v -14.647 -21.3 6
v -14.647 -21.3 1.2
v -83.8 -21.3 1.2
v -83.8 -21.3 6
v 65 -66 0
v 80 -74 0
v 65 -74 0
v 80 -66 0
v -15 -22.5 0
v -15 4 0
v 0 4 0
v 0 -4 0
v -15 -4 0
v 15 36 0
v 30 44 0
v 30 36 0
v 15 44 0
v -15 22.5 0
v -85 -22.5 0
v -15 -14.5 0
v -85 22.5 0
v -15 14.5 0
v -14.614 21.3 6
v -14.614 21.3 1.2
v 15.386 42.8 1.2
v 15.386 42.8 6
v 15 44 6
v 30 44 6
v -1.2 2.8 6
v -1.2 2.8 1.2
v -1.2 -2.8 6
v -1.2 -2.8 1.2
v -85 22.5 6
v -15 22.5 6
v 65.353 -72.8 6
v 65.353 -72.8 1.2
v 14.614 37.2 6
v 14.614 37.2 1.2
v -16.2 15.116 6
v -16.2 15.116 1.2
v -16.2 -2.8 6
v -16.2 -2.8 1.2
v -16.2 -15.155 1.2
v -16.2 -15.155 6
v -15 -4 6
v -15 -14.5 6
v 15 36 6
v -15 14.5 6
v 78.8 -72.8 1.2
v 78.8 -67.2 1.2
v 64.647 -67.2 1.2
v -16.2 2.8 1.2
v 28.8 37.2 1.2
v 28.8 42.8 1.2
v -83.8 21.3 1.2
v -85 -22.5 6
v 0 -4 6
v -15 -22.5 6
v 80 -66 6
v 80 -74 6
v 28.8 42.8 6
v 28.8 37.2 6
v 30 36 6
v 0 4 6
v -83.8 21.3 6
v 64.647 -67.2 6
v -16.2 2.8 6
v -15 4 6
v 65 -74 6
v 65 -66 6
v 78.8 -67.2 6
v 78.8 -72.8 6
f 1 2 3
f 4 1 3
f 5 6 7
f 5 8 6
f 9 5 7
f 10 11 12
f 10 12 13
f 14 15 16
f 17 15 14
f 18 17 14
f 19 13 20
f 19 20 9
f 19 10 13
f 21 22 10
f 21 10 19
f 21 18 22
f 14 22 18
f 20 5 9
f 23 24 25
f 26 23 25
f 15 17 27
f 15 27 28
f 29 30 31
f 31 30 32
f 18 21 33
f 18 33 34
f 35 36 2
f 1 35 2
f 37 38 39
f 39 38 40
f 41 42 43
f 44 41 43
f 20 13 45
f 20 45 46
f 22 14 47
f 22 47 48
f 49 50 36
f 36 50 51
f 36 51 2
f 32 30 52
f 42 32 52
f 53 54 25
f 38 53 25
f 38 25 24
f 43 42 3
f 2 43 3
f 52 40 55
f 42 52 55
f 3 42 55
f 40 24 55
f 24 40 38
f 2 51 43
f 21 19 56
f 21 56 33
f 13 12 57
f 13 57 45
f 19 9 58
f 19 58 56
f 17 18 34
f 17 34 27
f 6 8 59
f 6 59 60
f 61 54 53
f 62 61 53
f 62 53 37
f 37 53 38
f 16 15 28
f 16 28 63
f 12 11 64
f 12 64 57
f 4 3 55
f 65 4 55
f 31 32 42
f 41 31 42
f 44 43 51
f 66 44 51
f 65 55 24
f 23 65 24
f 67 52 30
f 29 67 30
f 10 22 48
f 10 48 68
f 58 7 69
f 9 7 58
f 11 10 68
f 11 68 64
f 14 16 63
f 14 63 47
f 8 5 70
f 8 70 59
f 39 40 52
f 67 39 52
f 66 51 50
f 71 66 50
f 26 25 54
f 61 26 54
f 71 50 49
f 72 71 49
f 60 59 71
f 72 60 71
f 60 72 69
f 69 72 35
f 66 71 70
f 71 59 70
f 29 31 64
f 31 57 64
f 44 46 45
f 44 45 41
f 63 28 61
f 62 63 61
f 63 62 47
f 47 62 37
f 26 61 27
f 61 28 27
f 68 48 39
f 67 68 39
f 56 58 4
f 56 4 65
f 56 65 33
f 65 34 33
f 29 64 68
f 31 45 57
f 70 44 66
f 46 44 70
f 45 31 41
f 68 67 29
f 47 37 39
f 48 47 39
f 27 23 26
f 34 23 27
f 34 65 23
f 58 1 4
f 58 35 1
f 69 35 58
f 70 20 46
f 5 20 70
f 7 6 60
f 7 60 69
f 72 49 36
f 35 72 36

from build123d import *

# Parameters (mm, degrees)
PAD_DEPTH   = 6
THICKNESS_T = -1.2


with BuildPart() as part:
    # Sketch → Pad (new body)
    with BuildSketch(Plane.XY):
        Polygon((80, -74), (65, -74), (-15, -22.5), (-85, -22.5), (-85, 22.5), (-15, 22.5), (15, 44), (30, 44), (30, 36), (15, 36), (-15, 14.5), (-15, 4), (0, 4), (0, -4), (-15, -4), (-15, -14.5), (65, -66), (80, -66), align=None)
    extrude(amount=PAD_DEPTH)

    # Thickness
    thickness_openings = [part.faces().sort_by_distance(p)[0] for p in [
        (-29.840547, -5.671982, 6),
    ]]
    offset(amount=THICKNESS_T, openings=thickness_openings, kind=Kind.INTERSECTION)


solid = part.part
